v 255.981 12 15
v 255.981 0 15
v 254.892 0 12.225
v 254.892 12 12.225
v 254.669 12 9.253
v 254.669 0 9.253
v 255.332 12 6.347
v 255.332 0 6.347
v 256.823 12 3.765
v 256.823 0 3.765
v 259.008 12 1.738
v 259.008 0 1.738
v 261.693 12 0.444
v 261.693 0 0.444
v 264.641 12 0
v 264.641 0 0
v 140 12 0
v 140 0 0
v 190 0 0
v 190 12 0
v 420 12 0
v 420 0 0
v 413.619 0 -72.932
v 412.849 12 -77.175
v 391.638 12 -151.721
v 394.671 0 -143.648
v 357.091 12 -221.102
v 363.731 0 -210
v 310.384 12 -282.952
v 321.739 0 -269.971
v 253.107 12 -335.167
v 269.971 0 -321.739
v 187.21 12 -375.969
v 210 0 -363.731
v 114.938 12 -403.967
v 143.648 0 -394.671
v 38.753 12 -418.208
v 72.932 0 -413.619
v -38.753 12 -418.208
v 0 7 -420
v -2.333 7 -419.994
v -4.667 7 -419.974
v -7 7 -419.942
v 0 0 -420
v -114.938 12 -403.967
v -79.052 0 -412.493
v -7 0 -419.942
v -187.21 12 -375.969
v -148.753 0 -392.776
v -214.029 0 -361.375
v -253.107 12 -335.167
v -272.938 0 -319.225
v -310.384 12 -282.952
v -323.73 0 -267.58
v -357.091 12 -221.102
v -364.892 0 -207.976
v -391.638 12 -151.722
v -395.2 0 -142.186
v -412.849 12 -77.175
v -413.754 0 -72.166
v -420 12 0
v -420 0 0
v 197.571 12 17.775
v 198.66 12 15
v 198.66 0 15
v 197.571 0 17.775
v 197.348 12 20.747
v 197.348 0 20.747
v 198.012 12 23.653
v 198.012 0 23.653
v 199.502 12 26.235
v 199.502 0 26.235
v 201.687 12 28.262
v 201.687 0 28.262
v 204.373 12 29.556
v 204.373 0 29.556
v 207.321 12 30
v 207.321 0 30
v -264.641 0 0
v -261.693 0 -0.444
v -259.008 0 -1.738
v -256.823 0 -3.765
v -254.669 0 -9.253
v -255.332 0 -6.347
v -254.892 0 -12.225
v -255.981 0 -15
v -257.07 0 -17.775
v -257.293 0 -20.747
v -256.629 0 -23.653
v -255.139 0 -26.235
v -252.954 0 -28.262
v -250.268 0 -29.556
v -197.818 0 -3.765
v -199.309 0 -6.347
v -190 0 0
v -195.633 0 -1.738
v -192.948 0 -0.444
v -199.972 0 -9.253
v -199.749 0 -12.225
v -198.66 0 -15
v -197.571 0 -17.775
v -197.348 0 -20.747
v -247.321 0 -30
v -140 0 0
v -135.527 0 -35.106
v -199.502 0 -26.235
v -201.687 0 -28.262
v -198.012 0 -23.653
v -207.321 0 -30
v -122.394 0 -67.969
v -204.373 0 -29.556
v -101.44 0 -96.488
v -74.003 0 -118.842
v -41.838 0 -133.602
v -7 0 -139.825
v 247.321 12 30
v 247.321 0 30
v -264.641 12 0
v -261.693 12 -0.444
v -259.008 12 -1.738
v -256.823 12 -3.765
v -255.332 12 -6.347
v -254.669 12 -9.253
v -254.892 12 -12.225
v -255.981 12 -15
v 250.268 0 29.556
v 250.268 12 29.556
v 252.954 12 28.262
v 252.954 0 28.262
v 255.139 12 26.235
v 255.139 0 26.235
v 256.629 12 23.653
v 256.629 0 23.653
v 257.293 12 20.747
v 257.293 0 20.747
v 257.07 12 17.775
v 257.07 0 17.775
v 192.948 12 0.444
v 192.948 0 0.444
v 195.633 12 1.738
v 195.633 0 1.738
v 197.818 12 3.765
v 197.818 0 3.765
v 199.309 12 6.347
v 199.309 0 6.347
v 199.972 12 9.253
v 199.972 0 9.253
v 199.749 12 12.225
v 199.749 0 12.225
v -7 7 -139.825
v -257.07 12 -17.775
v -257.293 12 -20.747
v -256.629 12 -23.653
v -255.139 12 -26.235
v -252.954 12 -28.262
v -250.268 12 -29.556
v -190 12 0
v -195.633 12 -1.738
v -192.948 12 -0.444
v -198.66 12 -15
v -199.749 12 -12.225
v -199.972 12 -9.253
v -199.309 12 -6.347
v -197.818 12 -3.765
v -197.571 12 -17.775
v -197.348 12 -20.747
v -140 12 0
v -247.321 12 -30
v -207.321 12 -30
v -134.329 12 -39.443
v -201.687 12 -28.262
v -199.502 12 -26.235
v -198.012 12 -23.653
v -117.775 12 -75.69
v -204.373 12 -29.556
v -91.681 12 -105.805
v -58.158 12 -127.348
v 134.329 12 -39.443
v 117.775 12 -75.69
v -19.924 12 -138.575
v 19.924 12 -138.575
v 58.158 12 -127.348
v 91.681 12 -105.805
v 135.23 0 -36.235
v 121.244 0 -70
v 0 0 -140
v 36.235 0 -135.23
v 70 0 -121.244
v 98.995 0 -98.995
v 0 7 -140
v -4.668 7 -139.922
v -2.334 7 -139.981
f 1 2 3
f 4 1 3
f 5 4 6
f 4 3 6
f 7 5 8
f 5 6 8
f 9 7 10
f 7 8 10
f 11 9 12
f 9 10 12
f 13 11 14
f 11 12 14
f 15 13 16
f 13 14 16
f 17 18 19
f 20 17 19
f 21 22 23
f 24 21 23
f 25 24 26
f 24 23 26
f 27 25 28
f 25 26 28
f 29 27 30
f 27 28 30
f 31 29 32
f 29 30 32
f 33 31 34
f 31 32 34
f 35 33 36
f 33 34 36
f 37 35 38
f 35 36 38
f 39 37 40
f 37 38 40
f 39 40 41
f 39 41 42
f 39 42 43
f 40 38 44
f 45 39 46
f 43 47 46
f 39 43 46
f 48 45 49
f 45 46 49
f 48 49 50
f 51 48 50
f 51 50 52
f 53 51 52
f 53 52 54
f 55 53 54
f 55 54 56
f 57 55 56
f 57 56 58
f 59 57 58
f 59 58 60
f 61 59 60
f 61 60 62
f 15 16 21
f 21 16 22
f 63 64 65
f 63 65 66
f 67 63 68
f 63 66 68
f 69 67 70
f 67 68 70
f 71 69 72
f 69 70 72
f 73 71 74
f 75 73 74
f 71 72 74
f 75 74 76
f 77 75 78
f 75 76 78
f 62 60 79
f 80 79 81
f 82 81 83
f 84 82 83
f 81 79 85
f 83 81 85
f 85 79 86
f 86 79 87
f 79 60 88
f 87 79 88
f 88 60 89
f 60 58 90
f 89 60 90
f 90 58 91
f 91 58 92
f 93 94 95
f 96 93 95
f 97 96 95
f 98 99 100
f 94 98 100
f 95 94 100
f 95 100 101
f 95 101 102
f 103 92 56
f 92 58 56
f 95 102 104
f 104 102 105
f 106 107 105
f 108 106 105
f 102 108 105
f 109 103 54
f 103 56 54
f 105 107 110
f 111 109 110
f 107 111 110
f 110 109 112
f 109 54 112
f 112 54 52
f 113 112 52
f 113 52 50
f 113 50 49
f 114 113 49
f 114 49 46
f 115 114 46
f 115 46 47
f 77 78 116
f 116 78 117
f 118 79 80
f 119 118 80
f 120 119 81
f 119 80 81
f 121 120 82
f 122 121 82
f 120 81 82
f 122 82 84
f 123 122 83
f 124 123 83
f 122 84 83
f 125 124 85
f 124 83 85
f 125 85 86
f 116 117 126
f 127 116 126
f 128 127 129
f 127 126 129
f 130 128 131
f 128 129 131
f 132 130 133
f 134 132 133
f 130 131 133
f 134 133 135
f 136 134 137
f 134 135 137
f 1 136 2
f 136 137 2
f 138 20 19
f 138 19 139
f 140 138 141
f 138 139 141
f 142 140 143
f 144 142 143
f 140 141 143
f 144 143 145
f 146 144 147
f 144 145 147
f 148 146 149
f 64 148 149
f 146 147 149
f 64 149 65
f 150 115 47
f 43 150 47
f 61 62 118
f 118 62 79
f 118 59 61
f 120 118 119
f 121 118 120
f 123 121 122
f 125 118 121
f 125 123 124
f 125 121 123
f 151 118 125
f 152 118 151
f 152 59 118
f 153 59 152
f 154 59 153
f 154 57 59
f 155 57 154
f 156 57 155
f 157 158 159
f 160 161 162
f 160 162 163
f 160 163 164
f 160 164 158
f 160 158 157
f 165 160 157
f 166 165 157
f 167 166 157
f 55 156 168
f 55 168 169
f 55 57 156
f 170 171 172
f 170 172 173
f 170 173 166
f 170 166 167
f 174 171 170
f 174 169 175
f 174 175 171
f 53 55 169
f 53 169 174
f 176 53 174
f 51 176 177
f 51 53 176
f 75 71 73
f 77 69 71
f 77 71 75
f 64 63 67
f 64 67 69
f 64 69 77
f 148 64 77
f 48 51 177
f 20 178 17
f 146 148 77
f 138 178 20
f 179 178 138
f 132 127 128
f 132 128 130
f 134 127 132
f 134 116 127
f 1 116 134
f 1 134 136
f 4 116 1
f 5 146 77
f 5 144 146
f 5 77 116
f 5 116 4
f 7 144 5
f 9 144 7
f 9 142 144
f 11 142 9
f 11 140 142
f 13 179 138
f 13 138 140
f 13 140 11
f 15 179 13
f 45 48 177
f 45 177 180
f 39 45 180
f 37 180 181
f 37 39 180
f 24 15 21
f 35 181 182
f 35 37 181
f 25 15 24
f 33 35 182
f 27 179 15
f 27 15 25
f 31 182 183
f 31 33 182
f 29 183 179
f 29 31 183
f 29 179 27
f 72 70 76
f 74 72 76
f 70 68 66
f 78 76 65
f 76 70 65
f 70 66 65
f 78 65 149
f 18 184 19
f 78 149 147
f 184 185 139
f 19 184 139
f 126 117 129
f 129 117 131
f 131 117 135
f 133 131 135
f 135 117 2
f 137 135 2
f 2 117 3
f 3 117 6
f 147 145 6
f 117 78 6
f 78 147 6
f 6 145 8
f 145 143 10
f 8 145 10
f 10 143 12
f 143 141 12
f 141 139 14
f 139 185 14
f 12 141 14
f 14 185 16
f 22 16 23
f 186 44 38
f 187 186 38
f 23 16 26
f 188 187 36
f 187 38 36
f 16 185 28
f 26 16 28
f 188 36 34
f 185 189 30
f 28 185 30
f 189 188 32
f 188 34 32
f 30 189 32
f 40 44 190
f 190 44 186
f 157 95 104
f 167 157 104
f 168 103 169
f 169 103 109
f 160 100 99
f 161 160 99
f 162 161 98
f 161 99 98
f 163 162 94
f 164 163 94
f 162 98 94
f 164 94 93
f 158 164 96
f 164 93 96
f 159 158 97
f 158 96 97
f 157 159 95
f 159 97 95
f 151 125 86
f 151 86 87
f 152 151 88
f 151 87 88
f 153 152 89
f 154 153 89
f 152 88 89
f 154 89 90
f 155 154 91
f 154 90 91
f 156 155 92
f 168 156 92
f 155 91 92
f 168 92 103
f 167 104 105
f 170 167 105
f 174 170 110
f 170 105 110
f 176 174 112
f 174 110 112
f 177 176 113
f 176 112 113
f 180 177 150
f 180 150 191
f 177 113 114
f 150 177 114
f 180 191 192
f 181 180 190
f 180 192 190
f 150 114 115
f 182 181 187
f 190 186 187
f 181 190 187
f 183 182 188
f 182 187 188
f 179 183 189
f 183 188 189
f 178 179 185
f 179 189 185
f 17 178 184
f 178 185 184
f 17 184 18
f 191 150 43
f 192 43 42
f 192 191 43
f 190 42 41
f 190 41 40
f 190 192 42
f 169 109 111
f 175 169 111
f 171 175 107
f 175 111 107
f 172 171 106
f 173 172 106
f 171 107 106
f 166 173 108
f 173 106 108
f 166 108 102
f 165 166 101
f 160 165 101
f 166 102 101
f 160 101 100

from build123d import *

# Parameters (mm, degrees)
BOSS_EXTRUDE1_DEPTH = 12
CUT_EXTRUDE1_DEPTH  = 7


with BuildPart() as part:
    # Sketch1 → Boss-Extrude1 (new body)
    with BuildSketch(Plane(origin=(0, 0, 0), x_dir=(1, 0, 0), z_dir=(0, 1, 0))):
        with BuildLine():
            Line((-420, 0), (-264.641016151, 0))
            ThreePointArc((-264.641016151, 0), (-255.980762114, 5), (-255.980762114, 15))
            ThreePointArc((-255.980762114, 15), (-255.980762114, 25), (-247.320508076, 30))
            Line((-247.320508076, 30), (-207.320508076, 30))
            ThreePointArc((-207.320508076, 30), (-198.660254038, 25), (-198.660254038, 15))
            ThreePointArc((-198.660254038, 15), (-198.660254038, 5), (-190, 0))
            Line((-190, 0), (-140, 0))
            ThreePointArc((-140, 0), (1.07e-06, 140), (140, -2.139e-06))
            Line((140, -2.139e-06), (190, -2.149e-06))
            ThreePointArc((190, -2.149e-06), (198.660254037, -5.000002151), (198.660254035, -15.000002151))
            ThreePointArc((198.660254035, -15.000002151), (198.660254033, -25.000002151), (207.32050807, -30.000002153))
            Line((207.32050807, -30.000002153), (247.32050807, -30.000002161))
            ThreePointArc((247.32050807, -30.000002161), (255.980762108, -25.000002163), (255.98076211, -15.000002163))
            ThreePointArc((255.98076211, -15.000002163), (255.980762113, -5.000002163), (264.641016151, -2.165e-06))
            Line((264.641016151, -2.165e-06), (420, -2.196e-06))
            ThreePointArc((420, -2.196e-06), (1.098e-06, 420), (-420, 0))
        make_face()
    extrude(amount=BOSS_EXTRUDE1_DEPTH)

    # Sketch2 → Cut-Extrude1 (cut)
    with BuildSketch(Plane.XZ):
        with BuildLine():
            ThreePointArc((0, -140), (-3.501094948, -139.956215775), (-7, -139.824890488))
            Line((-7, -139.824890488), (-7, -419.941662615))
            ThreePointArc((-7, -419.941662615), (-3.500121543, -419.985415401), (0, -420))
            Line((0, -420), (0, -140))
        make_face()
    extrude(amount=-CUT_EXTRUDE1_DEPTH, mode=Mode.SUBTRACT)


solid = part.part
